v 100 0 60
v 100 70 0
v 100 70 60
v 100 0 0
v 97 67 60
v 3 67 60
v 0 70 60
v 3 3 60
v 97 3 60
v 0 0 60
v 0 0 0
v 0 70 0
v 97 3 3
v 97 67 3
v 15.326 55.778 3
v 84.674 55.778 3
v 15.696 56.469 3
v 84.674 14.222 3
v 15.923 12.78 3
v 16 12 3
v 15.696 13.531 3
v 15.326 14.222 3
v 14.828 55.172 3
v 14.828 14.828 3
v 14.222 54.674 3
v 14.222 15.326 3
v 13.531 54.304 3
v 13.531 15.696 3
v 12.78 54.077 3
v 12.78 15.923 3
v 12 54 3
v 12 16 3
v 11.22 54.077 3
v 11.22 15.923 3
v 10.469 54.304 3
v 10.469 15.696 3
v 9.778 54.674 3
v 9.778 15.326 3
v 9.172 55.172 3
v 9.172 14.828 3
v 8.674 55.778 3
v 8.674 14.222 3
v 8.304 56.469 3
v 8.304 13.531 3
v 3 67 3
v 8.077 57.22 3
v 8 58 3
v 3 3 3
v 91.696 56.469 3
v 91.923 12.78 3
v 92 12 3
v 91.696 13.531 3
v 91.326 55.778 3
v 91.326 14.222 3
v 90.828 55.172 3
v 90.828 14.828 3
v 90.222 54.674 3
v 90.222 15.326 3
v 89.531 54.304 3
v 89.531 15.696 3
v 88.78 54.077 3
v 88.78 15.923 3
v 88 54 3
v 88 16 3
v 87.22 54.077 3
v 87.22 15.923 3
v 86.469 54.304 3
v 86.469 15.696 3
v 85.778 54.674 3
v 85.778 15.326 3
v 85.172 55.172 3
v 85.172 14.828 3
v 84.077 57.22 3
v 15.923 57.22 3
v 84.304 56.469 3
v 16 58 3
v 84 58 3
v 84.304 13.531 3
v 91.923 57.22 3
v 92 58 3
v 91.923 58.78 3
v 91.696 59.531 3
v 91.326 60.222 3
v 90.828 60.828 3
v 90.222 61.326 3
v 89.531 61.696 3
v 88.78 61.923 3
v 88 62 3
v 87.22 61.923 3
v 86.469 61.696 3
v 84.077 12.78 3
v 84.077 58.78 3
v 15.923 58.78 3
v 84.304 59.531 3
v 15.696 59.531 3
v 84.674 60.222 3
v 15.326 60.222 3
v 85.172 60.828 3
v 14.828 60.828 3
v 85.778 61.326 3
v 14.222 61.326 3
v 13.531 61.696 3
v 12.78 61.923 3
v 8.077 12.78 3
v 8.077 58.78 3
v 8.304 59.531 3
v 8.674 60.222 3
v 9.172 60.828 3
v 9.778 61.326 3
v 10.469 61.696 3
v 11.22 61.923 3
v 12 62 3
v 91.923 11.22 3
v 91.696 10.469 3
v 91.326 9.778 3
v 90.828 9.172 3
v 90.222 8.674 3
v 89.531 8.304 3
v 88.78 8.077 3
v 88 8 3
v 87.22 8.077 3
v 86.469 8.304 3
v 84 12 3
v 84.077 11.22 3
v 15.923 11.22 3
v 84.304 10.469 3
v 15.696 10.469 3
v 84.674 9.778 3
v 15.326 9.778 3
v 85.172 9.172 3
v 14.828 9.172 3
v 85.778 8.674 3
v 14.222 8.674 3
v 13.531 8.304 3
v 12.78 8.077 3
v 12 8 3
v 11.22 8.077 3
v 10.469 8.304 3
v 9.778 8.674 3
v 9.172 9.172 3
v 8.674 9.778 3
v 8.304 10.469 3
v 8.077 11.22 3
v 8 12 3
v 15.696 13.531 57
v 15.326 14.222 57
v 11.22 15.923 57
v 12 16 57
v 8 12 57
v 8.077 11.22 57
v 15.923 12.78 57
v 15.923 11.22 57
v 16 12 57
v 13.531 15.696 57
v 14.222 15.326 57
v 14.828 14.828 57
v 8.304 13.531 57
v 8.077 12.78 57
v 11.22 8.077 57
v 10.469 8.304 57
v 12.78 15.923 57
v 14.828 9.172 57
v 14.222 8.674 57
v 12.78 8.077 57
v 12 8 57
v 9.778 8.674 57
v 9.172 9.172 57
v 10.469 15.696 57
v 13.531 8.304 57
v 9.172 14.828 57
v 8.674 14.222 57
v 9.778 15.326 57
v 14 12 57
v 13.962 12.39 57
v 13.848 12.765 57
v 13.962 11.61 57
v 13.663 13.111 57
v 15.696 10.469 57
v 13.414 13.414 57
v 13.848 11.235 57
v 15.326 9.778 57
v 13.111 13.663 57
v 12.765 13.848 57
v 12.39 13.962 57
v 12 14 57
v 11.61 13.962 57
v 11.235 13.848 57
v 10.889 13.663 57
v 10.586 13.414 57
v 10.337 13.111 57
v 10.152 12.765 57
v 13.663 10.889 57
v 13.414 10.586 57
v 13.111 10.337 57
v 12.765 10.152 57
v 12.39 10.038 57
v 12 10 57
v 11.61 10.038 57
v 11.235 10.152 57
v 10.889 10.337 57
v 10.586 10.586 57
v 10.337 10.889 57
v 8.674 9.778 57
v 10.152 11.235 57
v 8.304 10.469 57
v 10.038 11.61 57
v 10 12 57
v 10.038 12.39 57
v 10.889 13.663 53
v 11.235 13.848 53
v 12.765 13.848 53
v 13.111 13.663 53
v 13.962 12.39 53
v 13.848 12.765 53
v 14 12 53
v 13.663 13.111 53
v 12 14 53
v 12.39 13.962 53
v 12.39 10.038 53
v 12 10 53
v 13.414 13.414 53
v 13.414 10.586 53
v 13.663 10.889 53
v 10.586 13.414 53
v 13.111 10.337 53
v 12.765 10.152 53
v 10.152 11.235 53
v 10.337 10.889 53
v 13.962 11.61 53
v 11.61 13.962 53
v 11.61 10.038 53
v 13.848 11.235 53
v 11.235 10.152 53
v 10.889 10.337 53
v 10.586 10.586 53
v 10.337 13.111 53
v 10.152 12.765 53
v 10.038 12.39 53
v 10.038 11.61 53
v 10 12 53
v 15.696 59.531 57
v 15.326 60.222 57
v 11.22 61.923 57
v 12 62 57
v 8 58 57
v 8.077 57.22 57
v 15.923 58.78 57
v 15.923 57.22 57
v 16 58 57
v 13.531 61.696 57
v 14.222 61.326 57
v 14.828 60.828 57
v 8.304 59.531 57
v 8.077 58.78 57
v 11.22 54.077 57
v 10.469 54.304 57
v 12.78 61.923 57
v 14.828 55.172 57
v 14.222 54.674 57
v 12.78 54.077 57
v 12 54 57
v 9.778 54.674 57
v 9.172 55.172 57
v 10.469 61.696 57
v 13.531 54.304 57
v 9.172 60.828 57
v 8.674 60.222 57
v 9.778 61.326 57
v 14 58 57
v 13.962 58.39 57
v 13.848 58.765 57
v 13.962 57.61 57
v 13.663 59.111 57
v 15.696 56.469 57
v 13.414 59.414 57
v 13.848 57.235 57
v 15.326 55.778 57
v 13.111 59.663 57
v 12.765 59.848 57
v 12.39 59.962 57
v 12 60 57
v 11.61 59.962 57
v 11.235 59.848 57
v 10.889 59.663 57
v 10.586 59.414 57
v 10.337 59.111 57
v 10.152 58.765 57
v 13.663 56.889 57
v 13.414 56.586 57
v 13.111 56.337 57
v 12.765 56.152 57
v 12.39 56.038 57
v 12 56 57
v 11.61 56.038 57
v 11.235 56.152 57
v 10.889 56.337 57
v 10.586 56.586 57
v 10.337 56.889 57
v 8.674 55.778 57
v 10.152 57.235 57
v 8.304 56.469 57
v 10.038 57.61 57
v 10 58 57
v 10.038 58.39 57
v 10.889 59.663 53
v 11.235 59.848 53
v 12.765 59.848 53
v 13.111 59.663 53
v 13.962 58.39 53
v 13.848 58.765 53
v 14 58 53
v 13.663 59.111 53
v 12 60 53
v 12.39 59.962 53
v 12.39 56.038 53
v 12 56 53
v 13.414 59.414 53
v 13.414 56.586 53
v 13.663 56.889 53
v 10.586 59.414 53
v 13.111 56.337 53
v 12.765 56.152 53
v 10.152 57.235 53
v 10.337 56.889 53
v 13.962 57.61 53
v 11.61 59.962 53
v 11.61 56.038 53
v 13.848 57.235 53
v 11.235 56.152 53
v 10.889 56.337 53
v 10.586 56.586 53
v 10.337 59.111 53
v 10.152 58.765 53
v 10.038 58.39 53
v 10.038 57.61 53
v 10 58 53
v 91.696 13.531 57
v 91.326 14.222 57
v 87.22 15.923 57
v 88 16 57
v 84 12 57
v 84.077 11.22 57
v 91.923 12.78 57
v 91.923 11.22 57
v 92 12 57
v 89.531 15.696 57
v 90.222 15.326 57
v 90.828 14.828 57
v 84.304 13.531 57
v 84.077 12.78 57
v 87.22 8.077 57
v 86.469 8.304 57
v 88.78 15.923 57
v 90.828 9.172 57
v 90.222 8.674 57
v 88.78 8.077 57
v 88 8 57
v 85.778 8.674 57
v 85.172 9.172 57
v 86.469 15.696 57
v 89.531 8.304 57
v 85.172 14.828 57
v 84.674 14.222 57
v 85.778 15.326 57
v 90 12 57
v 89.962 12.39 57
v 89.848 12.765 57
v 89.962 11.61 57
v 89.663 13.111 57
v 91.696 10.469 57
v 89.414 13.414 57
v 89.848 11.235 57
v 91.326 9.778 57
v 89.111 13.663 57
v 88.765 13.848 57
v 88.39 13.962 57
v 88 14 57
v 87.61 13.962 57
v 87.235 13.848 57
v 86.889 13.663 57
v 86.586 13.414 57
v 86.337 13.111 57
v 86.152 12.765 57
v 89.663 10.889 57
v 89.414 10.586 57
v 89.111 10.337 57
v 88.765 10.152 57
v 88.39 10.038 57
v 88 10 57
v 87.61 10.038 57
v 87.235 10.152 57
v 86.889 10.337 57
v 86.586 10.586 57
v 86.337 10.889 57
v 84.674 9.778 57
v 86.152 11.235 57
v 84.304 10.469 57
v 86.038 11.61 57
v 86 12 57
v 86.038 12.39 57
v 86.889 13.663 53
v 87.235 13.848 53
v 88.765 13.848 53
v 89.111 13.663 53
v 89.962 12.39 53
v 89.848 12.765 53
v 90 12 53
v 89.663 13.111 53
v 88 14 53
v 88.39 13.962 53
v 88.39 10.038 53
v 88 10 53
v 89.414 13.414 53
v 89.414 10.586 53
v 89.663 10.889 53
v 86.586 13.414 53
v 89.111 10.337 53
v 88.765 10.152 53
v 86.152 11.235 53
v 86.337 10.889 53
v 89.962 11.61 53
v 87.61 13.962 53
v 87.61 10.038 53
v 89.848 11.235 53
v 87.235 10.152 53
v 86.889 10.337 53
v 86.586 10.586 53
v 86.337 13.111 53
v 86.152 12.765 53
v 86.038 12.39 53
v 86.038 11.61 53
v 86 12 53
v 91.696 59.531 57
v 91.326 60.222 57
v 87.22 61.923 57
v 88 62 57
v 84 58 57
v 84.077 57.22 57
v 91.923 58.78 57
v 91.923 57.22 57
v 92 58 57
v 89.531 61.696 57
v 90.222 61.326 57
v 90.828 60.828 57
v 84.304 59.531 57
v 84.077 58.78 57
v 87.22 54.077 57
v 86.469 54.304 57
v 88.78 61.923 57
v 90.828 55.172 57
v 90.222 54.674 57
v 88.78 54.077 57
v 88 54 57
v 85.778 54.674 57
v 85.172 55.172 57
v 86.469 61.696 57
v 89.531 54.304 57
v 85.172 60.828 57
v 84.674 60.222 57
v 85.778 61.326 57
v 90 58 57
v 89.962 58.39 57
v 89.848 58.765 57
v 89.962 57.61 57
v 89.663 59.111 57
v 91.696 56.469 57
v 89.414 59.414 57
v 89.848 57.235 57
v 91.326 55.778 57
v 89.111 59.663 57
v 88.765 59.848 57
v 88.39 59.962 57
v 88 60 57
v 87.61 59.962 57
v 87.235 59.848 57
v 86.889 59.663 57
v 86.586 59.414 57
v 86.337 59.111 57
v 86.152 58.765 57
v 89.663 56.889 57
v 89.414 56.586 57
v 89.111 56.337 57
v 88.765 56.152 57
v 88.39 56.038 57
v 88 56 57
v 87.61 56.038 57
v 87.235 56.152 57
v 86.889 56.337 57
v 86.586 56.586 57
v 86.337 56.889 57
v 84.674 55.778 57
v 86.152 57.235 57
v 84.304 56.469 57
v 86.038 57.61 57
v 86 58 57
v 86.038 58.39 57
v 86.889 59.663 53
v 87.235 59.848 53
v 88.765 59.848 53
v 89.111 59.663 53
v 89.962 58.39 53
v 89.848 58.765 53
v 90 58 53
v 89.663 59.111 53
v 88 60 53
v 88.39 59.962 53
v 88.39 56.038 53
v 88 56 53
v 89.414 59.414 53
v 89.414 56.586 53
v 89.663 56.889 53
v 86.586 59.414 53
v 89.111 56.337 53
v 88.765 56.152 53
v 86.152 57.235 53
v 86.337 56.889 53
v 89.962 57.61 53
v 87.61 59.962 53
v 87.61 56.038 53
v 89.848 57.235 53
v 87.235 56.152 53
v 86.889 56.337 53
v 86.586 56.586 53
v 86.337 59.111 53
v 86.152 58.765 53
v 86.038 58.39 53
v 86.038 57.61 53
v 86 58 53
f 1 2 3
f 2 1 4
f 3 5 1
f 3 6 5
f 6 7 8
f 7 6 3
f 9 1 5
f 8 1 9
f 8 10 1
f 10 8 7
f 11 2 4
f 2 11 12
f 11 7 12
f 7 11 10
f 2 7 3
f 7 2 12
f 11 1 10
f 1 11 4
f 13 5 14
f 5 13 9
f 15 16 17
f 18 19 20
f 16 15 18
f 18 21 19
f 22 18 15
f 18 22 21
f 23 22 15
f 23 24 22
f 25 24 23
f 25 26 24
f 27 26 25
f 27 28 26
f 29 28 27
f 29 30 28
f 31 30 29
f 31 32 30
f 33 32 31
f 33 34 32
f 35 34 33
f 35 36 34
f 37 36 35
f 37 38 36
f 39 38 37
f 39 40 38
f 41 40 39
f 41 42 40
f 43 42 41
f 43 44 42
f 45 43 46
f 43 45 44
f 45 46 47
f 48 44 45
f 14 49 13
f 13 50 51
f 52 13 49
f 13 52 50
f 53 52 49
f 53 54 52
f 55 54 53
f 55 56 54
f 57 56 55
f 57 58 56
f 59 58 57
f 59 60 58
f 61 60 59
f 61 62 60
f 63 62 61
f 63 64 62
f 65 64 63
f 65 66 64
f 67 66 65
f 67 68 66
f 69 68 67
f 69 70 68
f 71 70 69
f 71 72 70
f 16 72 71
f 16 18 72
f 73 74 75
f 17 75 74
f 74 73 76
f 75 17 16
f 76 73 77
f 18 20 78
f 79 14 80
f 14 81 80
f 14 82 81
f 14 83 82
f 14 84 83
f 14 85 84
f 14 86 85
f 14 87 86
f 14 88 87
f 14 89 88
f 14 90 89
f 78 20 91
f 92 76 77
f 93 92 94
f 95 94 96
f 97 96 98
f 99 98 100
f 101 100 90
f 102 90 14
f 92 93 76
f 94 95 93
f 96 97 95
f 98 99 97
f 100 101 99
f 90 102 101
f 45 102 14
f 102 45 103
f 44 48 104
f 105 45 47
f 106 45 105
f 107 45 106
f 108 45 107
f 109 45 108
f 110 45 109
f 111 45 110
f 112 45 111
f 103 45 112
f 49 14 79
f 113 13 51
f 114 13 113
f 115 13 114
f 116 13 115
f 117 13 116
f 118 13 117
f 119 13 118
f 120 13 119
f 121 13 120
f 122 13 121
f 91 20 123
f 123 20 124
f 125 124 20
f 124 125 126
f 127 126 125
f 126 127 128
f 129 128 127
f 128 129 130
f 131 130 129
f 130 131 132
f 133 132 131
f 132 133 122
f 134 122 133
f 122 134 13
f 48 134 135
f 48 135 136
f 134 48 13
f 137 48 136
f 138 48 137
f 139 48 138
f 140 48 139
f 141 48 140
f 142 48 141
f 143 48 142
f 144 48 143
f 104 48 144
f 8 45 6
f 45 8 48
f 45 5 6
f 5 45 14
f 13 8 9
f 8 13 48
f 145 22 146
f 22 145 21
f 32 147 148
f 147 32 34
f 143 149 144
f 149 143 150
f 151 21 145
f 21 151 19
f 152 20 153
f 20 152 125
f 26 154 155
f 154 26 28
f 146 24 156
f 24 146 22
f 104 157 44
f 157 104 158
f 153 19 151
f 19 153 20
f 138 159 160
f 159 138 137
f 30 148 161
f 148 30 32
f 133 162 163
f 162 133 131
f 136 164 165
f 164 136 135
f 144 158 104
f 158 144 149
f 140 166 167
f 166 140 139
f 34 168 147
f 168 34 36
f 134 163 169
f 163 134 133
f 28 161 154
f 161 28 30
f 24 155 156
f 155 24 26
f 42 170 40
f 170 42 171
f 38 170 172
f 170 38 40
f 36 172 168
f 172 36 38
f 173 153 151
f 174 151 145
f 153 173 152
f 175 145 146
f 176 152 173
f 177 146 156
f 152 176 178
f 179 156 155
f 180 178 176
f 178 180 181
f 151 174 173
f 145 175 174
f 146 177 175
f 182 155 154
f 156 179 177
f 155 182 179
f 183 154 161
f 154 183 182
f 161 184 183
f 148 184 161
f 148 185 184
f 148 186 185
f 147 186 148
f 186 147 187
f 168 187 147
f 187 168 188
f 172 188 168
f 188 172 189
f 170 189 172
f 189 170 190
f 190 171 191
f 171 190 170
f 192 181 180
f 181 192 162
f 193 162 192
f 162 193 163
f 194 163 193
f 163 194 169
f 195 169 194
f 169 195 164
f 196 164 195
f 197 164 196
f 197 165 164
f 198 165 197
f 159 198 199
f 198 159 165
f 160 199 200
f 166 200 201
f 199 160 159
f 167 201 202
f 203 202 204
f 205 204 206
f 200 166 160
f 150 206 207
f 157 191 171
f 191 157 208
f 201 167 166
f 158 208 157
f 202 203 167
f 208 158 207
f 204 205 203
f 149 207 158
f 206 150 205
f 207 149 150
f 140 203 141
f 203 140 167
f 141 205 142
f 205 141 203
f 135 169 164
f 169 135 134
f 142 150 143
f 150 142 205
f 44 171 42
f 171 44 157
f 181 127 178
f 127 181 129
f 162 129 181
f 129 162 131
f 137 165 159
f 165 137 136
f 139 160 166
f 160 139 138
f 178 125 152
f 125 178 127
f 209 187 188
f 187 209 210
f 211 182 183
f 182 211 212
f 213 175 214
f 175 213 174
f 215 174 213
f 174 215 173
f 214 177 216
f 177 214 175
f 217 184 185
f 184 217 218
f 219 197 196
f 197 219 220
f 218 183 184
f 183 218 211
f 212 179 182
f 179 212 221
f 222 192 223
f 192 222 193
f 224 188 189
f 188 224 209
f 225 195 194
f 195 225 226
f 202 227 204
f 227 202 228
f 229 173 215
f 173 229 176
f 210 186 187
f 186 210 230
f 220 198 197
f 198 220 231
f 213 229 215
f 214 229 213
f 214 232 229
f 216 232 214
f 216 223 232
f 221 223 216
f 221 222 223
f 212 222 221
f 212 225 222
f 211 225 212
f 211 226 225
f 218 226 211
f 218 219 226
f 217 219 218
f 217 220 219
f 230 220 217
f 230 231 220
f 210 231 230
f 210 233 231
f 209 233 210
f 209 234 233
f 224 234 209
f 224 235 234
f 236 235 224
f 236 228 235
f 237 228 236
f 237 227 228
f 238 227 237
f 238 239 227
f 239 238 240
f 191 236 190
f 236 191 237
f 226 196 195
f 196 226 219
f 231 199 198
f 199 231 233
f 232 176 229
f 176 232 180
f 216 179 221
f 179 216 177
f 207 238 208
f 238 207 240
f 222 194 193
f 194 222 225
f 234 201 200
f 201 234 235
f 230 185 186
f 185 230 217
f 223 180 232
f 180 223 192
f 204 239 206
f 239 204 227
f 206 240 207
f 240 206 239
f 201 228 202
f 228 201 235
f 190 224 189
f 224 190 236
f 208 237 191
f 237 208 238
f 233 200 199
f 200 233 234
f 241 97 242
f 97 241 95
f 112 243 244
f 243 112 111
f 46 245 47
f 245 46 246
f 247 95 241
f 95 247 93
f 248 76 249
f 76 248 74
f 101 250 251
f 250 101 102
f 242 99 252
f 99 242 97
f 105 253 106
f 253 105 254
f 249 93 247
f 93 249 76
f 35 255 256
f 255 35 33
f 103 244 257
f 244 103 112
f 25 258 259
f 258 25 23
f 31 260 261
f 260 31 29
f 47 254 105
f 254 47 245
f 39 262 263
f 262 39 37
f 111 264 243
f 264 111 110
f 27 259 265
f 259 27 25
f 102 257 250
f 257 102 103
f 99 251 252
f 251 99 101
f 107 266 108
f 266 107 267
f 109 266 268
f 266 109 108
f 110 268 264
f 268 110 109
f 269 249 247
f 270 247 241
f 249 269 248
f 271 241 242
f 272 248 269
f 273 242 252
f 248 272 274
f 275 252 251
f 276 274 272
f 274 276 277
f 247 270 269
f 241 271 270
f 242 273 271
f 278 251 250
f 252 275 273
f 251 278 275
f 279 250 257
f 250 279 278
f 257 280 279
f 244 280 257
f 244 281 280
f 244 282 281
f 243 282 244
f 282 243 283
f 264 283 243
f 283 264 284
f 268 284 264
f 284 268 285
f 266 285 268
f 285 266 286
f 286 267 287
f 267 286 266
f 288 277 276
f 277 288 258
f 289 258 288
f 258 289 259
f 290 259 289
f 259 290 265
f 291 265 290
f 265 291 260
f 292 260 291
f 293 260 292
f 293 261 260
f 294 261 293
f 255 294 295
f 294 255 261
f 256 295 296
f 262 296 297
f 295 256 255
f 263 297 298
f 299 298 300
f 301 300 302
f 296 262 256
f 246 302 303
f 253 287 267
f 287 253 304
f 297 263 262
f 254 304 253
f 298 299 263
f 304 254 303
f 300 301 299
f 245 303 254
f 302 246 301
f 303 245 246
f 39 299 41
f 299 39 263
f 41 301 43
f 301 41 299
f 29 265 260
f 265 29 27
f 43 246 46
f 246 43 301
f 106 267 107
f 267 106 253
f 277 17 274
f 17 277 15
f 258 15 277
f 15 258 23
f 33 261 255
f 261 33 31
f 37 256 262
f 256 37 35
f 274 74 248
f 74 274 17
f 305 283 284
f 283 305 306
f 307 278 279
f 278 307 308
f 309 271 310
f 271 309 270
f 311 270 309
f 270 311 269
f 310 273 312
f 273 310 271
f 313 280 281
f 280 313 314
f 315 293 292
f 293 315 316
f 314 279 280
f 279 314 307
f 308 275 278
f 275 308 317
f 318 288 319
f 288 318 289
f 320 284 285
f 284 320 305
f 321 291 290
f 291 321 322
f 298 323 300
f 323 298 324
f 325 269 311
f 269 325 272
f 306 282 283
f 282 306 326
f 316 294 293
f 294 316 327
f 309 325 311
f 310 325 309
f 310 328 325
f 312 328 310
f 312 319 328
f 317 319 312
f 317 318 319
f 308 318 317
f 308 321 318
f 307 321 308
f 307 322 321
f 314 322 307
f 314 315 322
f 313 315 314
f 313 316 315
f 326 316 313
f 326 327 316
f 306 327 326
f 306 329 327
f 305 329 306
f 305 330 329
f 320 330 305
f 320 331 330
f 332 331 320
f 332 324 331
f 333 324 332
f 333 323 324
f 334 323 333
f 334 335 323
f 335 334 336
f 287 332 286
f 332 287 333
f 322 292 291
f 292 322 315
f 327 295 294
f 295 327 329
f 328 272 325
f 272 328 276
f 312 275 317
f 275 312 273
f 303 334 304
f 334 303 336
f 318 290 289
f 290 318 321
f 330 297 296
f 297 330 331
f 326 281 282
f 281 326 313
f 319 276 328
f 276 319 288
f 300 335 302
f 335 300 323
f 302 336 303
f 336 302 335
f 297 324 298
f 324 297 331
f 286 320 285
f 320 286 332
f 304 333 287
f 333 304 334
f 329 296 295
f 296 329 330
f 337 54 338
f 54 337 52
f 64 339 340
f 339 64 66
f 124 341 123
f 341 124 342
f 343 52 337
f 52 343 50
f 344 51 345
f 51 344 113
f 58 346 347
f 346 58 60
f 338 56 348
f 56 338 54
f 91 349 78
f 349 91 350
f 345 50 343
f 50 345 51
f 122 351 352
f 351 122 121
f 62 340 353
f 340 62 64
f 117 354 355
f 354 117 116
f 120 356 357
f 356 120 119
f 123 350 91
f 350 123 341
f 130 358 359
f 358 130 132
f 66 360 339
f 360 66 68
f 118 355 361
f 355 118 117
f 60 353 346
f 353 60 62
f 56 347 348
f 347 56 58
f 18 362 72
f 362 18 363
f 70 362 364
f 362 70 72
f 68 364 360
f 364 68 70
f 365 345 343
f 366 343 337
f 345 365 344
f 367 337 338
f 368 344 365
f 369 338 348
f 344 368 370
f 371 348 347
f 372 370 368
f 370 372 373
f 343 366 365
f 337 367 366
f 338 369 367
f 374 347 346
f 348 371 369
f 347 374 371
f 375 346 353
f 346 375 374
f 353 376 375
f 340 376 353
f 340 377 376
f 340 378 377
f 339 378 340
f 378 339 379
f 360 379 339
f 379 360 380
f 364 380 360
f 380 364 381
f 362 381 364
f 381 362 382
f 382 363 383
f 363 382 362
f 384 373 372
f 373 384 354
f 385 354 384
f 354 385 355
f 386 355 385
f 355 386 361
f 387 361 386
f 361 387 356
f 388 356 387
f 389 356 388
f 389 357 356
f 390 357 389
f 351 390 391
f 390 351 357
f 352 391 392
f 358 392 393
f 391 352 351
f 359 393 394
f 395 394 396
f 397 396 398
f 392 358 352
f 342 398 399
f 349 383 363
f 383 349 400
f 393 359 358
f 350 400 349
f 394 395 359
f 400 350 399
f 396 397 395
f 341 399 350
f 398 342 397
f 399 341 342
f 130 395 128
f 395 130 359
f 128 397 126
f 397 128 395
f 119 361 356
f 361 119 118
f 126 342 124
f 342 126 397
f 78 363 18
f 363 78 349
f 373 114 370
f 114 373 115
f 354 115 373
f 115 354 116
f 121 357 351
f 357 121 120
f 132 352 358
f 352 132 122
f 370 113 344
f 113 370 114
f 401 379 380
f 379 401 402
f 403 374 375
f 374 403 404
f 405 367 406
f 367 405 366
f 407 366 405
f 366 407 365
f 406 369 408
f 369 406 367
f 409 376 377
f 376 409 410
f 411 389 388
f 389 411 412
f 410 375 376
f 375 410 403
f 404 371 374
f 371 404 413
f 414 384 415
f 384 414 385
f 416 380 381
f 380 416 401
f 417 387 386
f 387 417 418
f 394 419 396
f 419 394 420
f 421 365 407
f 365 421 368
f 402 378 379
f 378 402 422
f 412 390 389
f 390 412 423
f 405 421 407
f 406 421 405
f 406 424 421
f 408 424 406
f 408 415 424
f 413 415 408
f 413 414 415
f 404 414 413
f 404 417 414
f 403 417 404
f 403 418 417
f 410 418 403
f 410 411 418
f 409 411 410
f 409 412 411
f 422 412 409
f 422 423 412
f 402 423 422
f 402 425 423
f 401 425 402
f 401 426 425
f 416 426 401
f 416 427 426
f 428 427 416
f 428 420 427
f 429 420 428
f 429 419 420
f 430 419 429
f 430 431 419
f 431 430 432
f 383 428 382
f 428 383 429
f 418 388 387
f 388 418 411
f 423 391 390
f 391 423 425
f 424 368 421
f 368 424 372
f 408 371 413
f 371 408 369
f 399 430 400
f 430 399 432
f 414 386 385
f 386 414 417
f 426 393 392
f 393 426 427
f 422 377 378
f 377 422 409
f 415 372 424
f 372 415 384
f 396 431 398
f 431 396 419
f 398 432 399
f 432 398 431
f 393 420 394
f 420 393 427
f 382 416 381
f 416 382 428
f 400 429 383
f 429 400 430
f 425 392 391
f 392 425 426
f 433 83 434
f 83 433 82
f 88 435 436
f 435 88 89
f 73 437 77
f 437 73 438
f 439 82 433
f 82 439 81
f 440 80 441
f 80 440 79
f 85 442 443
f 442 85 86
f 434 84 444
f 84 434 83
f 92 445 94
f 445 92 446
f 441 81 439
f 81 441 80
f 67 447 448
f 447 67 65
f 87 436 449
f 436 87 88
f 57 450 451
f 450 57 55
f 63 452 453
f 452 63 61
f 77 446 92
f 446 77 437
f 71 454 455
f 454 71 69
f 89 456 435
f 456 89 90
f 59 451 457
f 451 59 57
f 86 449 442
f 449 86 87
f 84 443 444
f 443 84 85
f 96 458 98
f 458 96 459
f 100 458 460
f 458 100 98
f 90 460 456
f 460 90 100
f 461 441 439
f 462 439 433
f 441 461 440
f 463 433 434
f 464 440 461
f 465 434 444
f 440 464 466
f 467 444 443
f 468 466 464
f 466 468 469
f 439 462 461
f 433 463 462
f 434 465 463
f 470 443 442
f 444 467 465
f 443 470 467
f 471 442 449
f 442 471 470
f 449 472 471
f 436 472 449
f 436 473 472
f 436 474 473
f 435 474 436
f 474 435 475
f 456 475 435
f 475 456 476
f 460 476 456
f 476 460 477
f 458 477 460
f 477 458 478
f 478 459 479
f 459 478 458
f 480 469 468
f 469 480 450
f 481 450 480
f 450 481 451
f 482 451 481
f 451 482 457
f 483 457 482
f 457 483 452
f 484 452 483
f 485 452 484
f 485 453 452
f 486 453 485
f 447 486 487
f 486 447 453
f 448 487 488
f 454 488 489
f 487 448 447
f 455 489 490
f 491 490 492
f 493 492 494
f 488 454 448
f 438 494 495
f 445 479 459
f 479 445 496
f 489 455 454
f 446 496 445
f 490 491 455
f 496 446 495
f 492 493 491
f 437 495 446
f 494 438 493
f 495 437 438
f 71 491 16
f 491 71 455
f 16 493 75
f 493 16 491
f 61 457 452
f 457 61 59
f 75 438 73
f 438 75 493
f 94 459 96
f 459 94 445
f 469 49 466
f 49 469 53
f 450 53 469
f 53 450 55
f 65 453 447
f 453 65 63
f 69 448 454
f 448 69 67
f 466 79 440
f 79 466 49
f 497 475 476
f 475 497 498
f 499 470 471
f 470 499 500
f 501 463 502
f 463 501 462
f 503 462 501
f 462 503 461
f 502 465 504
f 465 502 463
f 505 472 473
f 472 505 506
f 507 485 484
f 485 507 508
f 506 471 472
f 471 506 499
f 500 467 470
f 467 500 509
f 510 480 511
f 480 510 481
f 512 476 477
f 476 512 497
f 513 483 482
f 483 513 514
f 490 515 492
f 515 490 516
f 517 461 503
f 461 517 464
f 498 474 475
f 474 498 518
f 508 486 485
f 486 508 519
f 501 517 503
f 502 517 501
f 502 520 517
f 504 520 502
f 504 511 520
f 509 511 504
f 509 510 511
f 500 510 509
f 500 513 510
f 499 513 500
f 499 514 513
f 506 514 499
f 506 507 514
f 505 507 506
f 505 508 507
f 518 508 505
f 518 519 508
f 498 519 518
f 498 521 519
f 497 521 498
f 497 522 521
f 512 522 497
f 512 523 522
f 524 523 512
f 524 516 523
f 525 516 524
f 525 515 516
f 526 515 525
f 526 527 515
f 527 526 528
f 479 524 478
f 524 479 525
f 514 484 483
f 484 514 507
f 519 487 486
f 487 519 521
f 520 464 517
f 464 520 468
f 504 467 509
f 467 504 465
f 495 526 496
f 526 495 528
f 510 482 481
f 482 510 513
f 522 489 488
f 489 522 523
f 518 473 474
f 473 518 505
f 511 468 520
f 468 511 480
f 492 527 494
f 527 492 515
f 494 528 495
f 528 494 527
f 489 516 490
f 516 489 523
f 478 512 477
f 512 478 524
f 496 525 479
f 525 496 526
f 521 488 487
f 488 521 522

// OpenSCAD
$fn = 32;

// ----------------------------------------------------------------------
// Enclosure box: bosses enclosure
// ----------------------------------------------------------------------

// --- parameters (mm) ---
box_l = 100;              // outer length, X
box_w = 70;               // outer width, Y
box_h = 60;               // outer height
wall_t = 3;               // wall thickness
boss_r = 4;               // corner boss radius
hole_r = 2;               // boss screw hole radius
boss_in = 12;             // boss inset from the corners

inner_h = box_h - wall_t;  // cavity depth
boss_h = inner_h - 2;  // corner boss height

difference() {
  union() {
    difference() {
      cube([box_l, box_w, box_h]);
      translate([wall_t, wall_t, wall_t])
        cube([box_l - 2 * wall_t, box_w - 2 * wall_t, box_h]);
    }
    for (sx = [0, 1], sy = [0, 1])
      translate([sx ? box_l - boss_in : boss_in,
                 sy ? box_w - boss_in : boss_in, wall_t - 1])
        difference() {
          cylinder(r = boss_r, h = boss_h);
          translate([0, 0, boss_h - 4])
            cylinder(r = hole_r, h = 5);
        }
  }
}
